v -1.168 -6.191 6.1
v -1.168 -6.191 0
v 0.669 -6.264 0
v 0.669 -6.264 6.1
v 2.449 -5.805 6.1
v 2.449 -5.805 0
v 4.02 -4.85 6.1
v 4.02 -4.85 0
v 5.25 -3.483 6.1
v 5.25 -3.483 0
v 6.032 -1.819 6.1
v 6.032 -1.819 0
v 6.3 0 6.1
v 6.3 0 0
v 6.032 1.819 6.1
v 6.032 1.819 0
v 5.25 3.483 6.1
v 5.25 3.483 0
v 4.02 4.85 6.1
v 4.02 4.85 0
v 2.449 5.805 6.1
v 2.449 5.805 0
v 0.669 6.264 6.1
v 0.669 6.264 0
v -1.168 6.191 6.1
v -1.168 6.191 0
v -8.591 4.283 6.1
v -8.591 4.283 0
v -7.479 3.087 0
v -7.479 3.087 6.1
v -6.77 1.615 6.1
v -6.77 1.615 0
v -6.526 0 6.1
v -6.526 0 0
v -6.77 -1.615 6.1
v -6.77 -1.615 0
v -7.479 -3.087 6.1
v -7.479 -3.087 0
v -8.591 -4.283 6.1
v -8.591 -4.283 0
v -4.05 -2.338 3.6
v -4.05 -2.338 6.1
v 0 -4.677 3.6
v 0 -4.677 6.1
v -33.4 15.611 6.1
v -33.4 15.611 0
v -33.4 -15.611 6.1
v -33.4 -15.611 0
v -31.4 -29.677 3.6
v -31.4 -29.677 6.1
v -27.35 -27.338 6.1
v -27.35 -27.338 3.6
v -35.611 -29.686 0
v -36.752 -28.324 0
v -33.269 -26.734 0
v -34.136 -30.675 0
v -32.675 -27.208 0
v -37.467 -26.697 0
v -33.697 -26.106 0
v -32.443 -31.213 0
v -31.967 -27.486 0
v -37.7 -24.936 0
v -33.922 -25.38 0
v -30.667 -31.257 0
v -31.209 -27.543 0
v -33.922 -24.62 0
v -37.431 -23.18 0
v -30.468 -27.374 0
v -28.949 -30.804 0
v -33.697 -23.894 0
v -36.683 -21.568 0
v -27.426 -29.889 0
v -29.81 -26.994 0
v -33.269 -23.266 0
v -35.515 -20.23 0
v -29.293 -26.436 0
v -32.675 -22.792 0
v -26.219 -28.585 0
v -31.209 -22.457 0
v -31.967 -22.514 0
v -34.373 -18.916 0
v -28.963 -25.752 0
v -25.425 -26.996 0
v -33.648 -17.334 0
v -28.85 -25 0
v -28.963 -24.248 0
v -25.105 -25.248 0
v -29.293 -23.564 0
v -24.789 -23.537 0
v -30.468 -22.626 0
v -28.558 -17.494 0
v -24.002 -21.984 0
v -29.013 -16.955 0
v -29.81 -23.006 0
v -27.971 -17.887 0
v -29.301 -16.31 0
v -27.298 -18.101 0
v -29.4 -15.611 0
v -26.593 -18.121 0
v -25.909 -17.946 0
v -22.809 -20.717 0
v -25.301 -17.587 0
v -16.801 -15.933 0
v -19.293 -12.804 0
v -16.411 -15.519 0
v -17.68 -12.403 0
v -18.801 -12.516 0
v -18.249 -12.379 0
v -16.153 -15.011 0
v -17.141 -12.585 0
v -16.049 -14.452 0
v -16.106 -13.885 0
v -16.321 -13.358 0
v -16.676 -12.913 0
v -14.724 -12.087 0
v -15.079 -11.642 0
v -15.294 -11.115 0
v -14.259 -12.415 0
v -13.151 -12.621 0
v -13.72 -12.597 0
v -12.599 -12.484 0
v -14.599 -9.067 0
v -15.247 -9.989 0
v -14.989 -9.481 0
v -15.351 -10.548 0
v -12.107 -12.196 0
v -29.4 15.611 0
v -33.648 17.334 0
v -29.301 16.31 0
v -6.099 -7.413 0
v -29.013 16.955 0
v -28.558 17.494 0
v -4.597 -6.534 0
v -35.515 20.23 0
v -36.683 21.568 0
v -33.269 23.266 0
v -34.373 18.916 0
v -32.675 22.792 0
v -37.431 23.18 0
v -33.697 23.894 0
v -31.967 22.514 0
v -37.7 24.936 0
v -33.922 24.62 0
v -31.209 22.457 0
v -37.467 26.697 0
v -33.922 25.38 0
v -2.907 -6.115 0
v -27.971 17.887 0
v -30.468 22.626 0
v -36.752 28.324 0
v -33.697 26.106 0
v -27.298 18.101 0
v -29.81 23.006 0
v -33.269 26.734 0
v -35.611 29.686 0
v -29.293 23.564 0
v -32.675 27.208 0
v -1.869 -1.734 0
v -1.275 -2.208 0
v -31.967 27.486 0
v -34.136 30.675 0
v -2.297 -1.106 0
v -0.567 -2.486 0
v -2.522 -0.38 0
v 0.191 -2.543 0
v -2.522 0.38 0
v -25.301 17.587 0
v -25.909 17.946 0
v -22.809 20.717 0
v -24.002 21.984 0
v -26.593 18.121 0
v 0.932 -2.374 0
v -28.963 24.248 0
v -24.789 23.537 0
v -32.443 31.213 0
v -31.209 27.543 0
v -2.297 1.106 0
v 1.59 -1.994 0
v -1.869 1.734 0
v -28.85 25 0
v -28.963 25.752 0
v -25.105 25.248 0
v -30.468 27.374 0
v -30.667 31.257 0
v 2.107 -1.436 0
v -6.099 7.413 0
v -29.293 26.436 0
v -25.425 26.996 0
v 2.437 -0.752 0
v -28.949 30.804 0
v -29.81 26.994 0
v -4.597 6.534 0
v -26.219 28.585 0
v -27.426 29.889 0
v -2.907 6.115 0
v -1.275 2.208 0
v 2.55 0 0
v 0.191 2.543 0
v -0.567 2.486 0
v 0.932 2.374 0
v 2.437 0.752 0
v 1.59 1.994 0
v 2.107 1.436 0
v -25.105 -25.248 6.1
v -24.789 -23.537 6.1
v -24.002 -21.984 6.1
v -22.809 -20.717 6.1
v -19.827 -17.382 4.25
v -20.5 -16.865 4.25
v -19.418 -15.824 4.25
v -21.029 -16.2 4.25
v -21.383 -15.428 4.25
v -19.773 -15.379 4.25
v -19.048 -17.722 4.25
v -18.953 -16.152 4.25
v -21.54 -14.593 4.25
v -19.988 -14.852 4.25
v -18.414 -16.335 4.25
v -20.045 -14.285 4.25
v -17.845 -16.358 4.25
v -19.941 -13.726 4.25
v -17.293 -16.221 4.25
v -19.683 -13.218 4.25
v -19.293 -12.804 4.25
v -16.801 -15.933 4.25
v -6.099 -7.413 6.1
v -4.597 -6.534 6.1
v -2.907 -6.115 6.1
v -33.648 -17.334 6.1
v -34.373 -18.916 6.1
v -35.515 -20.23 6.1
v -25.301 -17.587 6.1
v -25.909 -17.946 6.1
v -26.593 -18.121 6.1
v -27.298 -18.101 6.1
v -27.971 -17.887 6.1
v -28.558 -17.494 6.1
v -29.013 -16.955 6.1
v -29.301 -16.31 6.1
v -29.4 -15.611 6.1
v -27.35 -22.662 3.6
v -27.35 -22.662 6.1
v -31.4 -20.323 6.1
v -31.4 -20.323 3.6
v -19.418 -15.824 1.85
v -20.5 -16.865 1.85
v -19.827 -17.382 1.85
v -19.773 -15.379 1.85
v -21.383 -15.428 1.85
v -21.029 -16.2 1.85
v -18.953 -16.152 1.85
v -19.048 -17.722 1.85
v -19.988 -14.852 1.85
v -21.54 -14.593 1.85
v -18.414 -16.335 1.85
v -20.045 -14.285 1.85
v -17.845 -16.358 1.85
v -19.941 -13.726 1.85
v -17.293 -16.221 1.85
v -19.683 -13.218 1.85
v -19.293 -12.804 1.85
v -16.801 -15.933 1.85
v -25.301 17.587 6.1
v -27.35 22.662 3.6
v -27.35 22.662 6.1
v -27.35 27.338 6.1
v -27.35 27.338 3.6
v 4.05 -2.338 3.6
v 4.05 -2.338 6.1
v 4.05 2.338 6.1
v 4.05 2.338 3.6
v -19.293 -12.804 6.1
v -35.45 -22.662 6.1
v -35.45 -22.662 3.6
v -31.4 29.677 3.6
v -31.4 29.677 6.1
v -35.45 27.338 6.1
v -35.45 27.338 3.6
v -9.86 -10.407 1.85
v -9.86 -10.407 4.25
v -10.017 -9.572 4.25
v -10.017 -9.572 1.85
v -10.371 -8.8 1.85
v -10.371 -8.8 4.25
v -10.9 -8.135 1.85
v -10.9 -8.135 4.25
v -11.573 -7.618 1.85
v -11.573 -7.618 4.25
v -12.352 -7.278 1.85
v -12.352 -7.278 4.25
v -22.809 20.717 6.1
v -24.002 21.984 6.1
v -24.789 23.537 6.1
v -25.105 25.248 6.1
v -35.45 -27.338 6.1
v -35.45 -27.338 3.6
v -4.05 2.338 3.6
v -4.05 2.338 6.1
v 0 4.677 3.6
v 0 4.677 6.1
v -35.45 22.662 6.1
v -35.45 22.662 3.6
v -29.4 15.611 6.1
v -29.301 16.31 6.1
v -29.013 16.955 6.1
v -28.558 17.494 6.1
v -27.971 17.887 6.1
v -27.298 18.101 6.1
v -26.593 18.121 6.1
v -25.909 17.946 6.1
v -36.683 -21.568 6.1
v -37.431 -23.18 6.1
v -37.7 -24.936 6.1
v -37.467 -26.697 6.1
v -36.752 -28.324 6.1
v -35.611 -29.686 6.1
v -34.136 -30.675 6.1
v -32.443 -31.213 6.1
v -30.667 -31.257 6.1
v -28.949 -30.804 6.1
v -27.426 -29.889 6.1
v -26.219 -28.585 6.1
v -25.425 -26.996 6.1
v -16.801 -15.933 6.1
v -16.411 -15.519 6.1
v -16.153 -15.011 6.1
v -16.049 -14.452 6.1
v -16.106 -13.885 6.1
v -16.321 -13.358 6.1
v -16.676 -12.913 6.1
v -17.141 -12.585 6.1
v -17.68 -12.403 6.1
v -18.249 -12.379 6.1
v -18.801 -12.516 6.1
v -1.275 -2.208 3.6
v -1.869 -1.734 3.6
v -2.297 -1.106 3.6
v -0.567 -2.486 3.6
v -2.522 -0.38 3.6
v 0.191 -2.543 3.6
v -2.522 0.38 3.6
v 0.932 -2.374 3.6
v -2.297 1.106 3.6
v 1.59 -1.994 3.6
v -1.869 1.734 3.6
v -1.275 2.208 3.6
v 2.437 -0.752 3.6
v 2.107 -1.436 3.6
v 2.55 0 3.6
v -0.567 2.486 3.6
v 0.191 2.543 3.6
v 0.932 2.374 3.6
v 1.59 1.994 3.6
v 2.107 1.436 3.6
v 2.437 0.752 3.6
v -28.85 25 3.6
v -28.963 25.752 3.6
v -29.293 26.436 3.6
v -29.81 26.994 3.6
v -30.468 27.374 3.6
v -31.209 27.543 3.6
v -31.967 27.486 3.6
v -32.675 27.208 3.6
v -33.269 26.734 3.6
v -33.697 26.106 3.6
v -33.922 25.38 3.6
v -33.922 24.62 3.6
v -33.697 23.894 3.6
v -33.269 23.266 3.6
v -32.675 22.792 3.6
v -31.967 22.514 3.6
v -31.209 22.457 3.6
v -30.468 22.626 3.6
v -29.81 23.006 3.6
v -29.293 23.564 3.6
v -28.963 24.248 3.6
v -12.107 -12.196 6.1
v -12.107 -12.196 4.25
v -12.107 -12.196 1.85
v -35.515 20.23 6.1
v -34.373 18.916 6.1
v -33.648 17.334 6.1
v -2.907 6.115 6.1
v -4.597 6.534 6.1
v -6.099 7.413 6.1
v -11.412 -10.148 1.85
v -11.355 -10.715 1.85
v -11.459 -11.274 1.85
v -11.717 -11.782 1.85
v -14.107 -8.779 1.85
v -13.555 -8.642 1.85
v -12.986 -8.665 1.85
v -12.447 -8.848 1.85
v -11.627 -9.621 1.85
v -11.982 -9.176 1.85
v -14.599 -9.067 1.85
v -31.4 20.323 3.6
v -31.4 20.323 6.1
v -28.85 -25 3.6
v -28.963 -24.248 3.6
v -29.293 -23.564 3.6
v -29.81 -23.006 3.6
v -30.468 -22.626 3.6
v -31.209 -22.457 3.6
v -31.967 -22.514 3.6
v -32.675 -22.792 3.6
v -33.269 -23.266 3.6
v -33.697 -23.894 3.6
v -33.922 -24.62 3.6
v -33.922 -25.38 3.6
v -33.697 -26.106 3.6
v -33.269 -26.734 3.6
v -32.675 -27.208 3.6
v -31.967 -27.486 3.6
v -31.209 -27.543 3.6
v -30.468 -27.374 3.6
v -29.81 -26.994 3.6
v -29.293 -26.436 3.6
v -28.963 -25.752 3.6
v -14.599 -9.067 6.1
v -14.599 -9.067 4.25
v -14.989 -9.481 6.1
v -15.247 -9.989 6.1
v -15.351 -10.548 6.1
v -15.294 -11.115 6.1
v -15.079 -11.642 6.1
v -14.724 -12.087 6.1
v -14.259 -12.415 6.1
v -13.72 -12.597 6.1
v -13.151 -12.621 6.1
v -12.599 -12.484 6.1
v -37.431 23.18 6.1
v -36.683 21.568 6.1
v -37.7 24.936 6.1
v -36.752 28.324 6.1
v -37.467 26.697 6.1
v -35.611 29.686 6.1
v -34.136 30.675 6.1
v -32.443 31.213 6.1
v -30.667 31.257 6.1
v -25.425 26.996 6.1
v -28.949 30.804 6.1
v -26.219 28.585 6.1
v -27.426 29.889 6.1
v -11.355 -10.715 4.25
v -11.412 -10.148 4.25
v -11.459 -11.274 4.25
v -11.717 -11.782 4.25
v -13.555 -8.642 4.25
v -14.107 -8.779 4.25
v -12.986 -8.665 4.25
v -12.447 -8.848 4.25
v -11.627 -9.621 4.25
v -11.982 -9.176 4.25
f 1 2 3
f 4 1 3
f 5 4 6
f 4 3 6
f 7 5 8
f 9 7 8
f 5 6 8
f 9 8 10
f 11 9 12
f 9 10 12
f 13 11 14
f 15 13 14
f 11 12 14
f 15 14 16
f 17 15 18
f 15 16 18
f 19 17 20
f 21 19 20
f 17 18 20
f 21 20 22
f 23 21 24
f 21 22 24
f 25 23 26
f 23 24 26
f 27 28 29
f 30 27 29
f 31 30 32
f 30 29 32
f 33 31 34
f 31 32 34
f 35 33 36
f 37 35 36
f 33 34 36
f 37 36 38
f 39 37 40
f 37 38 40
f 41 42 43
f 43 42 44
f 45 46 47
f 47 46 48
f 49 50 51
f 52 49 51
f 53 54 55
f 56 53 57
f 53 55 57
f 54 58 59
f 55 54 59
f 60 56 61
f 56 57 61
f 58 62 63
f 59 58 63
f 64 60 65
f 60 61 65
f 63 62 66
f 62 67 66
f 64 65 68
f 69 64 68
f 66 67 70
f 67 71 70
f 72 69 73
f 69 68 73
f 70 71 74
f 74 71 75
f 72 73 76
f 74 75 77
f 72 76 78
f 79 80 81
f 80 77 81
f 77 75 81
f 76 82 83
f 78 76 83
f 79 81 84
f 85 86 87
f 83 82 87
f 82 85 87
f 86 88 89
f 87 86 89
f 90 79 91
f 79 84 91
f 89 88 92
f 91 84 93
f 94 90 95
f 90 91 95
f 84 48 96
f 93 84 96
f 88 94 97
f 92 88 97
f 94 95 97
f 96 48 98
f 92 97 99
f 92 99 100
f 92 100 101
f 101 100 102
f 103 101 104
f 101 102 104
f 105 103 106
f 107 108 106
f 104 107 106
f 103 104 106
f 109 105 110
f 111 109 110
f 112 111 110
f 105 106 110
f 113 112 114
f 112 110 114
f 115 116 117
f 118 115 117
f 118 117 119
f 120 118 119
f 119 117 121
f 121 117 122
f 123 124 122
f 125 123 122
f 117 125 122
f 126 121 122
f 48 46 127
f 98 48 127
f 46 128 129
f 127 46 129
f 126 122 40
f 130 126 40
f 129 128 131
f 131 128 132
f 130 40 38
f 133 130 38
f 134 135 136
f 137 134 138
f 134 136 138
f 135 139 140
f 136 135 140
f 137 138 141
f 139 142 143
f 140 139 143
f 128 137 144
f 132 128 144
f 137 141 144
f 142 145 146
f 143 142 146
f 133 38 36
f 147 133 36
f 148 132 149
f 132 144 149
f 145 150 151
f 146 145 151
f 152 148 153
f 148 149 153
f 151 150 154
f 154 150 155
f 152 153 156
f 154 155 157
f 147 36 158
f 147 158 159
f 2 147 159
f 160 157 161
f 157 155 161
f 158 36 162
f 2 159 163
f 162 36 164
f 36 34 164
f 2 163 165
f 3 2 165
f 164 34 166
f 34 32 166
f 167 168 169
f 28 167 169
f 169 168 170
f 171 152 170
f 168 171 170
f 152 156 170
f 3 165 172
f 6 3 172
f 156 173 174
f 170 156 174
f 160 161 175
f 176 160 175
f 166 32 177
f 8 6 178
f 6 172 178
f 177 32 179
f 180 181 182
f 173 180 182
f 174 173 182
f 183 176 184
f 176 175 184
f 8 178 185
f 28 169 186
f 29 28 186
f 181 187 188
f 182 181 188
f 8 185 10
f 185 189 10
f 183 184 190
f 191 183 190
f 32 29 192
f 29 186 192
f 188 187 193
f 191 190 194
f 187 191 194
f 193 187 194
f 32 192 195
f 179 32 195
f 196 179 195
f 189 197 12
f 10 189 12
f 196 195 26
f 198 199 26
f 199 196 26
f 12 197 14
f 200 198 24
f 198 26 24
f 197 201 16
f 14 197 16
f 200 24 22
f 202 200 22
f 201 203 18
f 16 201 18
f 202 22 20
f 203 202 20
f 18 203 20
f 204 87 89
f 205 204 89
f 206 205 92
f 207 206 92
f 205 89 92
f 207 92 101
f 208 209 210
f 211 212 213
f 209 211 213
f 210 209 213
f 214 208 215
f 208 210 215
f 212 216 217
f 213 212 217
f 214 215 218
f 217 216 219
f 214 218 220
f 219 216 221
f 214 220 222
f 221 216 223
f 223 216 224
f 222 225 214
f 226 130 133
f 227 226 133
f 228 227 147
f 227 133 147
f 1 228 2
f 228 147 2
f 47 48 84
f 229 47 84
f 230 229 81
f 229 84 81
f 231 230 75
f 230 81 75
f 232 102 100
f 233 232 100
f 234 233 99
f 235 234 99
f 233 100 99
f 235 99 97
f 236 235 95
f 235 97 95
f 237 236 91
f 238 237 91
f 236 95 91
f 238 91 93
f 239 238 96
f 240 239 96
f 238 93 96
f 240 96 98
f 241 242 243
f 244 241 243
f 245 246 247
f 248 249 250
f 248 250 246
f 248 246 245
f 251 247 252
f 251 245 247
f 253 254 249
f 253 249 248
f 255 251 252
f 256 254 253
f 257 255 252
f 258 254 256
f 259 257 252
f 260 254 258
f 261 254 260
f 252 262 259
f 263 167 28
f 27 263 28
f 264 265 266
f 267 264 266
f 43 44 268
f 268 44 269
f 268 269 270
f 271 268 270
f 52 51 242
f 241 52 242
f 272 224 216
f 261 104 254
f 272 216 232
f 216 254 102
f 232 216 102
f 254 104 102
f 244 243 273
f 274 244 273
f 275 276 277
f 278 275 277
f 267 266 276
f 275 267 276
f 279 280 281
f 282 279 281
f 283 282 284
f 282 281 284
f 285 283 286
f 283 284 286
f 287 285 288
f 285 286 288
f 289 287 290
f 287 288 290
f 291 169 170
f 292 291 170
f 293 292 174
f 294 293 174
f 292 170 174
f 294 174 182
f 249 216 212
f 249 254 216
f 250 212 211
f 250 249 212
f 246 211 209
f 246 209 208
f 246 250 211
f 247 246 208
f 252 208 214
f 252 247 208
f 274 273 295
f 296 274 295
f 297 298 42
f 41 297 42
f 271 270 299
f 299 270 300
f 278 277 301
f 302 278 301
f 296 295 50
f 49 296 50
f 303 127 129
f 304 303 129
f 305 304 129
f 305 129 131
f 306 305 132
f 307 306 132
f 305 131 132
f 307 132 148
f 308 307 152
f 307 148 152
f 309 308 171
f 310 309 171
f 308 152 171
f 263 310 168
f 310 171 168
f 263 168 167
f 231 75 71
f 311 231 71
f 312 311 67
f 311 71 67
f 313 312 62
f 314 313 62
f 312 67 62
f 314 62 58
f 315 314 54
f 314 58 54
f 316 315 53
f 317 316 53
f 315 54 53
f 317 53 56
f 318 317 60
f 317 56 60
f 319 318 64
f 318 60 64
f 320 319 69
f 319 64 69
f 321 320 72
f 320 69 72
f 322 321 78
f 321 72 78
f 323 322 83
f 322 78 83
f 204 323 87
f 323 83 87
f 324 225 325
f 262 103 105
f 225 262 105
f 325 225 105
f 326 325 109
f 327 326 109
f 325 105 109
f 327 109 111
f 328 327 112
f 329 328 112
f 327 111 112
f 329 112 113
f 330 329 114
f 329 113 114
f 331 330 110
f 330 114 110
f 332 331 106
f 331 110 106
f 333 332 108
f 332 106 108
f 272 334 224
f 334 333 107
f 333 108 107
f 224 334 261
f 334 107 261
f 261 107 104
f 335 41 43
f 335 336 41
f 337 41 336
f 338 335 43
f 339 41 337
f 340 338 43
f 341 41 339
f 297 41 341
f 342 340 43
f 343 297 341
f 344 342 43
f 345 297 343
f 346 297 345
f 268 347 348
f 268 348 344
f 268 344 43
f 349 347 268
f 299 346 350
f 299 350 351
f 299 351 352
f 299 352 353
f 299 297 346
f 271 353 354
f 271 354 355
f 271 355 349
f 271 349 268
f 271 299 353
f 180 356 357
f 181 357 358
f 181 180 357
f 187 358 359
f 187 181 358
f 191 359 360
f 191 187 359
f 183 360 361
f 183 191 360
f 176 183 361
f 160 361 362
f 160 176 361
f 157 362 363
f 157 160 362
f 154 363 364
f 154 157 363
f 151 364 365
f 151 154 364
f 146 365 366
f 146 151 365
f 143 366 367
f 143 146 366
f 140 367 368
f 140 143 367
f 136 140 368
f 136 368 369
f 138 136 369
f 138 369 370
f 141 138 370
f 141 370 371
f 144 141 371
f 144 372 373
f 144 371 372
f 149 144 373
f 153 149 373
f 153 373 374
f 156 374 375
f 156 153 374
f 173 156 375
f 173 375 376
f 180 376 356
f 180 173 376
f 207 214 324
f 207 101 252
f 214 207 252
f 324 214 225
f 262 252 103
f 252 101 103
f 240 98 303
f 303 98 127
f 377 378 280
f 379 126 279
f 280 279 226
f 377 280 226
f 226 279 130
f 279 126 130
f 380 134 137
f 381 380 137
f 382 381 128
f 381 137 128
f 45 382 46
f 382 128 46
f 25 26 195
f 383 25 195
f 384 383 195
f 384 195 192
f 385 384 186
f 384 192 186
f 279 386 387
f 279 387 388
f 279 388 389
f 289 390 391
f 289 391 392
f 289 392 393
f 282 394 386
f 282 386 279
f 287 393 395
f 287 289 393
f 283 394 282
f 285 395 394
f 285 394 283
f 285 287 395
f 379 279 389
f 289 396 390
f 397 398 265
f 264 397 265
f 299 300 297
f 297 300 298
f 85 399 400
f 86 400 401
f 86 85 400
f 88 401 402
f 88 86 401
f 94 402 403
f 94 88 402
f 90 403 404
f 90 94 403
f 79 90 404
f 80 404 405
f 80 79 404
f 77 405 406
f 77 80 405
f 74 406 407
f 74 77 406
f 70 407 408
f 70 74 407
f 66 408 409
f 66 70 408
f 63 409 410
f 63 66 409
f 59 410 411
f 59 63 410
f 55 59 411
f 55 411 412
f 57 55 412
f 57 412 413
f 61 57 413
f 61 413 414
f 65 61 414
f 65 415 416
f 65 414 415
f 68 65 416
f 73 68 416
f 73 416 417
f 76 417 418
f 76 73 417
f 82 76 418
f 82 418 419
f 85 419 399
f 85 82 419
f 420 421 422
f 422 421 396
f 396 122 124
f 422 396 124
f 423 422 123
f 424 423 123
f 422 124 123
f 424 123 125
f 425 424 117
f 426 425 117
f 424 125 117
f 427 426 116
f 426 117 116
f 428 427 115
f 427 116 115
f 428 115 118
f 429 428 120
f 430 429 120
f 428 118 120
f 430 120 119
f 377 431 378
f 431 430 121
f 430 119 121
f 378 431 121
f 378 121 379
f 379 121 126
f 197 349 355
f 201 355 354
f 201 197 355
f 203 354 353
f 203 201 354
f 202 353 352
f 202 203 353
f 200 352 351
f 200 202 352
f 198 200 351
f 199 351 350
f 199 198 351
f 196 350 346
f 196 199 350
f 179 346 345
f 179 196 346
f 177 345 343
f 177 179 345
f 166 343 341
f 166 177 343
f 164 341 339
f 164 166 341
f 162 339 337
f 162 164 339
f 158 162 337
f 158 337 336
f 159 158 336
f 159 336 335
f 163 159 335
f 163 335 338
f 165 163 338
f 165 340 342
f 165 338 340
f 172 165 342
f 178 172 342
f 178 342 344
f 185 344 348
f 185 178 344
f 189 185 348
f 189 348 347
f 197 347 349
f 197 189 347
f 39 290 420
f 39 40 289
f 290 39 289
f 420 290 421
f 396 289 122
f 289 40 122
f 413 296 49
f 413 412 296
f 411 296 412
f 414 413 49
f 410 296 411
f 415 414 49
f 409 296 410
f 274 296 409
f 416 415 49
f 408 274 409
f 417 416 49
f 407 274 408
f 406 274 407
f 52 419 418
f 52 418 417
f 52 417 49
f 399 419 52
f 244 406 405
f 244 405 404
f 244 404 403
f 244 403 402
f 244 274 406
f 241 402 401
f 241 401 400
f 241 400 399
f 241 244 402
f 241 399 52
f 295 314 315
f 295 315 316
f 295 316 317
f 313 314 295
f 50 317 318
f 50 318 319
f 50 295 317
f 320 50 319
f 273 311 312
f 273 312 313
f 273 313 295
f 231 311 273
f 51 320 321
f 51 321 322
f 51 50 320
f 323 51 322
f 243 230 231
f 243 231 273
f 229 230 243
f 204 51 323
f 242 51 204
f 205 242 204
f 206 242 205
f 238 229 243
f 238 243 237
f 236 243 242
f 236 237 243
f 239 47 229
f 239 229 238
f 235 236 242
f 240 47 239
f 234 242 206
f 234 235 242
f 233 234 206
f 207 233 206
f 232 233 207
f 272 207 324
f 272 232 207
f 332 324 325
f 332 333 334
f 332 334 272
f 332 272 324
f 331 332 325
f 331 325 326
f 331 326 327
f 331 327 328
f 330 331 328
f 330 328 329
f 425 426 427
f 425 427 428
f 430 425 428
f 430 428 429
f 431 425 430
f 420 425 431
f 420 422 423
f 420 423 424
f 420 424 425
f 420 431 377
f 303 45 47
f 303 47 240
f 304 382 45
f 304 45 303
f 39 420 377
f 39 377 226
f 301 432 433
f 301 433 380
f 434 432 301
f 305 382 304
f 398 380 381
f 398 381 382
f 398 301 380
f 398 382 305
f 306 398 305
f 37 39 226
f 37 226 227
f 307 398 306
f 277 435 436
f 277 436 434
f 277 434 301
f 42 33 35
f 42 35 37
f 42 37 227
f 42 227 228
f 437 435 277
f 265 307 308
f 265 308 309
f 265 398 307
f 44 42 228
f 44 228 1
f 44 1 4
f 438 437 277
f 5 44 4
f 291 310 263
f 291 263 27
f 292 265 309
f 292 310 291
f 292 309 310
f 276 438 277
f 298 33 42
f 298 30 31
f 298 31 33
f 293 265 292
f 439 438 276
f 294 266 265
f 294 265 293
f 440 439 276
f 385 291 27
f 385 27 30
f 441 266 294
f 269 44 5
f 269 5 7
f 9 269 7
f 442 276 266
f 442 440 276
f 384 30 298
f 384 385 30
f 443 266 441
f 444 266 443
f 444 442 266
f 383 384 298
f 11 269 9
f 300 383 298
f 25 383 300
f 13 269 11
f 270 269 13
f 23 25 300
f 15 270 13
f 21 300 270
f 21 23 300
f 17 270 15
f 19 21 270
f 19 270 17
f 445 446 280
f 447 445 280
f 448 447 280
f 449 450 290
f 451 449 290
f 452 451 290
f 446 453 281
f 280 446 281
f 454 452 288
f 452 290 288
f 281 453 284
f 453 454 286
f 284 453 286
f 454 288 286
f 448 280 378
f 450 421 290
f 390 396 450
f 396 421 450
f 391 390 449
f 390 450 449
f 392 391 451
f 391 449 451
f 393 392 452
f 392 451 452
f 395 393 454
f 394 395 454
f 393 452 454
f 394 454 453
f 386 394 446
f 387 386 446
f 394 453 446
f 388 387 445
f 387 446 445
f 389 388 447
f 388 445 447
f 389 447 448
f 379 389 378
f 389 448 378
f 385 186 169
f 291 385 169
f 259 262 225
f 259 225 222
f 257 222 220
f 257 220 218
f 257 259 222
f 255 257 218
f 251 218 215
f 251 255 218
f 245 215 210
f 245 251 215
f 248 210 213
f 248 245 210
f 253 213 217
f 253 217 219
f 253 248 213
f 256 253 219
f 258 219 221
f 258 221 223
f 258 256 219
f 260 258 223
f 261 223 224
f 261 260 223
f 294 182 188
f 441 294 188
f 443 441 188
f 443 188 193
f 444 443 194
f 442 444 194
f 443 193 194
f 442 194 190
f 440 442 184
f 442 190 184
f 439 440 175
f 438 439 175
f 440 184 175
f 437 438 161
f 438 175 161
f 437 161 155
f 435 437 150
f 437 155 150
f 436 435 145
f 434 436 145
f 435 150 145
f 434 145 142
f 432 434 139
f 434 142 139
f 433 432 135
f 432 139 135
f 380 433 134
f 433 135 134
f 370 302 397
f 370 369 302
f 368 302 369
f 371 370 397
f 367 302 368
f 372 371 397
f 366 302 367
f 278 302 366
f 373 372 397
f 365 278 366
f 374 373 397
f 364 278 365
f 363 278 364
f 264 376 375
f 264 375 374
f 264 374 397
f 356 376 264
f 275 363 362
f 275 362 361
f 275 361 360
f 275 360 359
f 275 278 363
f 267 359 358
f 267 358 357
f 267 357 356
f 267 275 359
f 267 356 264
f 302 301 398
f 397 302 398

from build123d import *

# Parameters (mm, degrees)
F0_R     = 2.55
F1_DEPTH = 6.1
F3_DEPTH = 2.5
F6_DEPTH = 1.2


with BuildPart() as f1:
    # F0 (on Top) → F1 (new body)
    with BuildSketch(Plane.XY):
        with BuildLine():
            ThreePointArc((-22.8091472875, 20.7166310371), (-24.4512119604, 22.7321355607), (-25.1048969271, 25.2483491523))
            ThreePointArc((-25.1048969271, 25.2483491523), (-34.1357153903, 30.6750208196), (-35.5153225806, 20.2298721131))
            ThreePointArc((-35.5153225806, 20.2298721131), (-33.9539864651, 18.15120321), (-33.4, 15.6111768576))
            Line((-33.4, 15.6111768576), (-33.4, -15.6111768576))
            ThreePointArc((-33.4, -15.6111768576), (-33.9539864651, -18.15120321), (-35.5153225806, -20.2298721131))
            ThreePointArc((-35.5153225806, -20.2298721131), (-34.1357149704, -30.6750210221), (-25.1048968903, -25.2483482207))
            ThreePointArc((-25.1048968903, -25.2483482207), (-24.4512125214, -22.7321357825), (-22.8091487233, -20.7166321802))
            Line((-22.8091487233, -20.7166321802), (-16.801235426, -15.9332617206))
            ThreePointArc((-16.801235426, -15.9332617206), (-16.4823258273, -13.1228708816), (-19.2927166663, -12.8039612829))
            Line((-19.2927166663, -12.8039612829), (-25.3006299635, -17.5873317424))
            ThreePointArc((-25.3006299635, -17.5873317424), (-27.9708920533, -17.8865901621), (-29.4, -15.6111768576))
            Line((-29.4, -15.6111768576), (-29.4, 15.6111768576))
            ThreePointArc((-29.4, 15.6111768576), (-27.9708912267, 17.8865905605), (-25.3006285278, 17.5873305993))
            Line((-25.3006285278, 17.5873305993), (-8.5908527125, 4.2833689629))
            ThreePointArc((-8.5908527125, 4.2833689629), (-6.5260006587, 0), (-8.5908527125, -4.2833689629))
            Line((-8.5908527125, -4.2833689629), (-14.5987660097, -9.0667394225))
            ThreePointArc((-14.5987660097, -9.0667394225), (-14.9176756084, -11.8771302615), (-12.1072847694, -12.1960398602))
            Line((-12.1072847694, -12.1960398602), (-6.0993714722, -7.4126694007))
            ThreePointArc((-6.0993714722, -7.4126694007), (-3.7671833568, -6.2639599209), (-1.1684785693, -6.1906912242))
            ThreePointArc((-1.1684785693, -6.1906912242), (6.3, 0), (-1.1684785693, 6.1906912242))
            ThreePointArc((-1.1684785693, 6.1906912242), (-3.7671833568, 6.2639599209), (-6.0993714722, 7.4126694007))
            Line((-6.0993714722, 7.4126694007), (-22.8091472875, 20.7166310371))
        make_face()
        with Locations((-31.4, -25)):
            Circle(F0_R, mode=Mode.SUBTRACT)
        with Locations((-31.4, 25)):
            Circle(F0_R, mode=Mode.SUBTRACT)
        Circle(F0_R, mode=Mode.SUBTRACT)
    extrude(amount=F1_DEPTH)

    # F2 (on face) → F3 (cut)
    with BuildSketch(Plane.XY.offset(6.1)):
        Polygon((-27.35, 22.6617314098), (-27.35, 27.3382685902), (-31.4, 29.6765371804), (-35.45, 27.3382685902), (-35.45, 22.6617314098), (-31.4, 20.3234628196), align=None)
        Polygon((-27.35, -27.3382685902), (-27.35, -22.6617314098), (-31.4, -20.3234628196), (-35.45, -22.6617314098), (-35.45, -27.3382685902), (-31.4, -29.6765371804), align=None)
        Polygon((-4.05, 2.3382685902), (-4.05, -2.3382685902), (0, -4.6765371804), (4.05, -2.3382685902), (4.05, 2.3382685902), (0, 4.6765371804), align=None)
    extrude(amount=-F3_DEPTH, mode=Mode.SUBTRACT)

    # F5 (on mid) → F6 (cut, symmetric)
    with BuildSketch(Plane.XY.offset(3.05)):
        with BuildLine():
            Line((-19.2927166663, -12.8039612829), (-21.5397744668, -14.5930200413))
            ThreePointArc((-21.5397744668, -14.5930200413), (-20.7851139292, -16.5486575869), (-19.0482932266, -17.722320479))
            Line((-19.0482932266, -17.722320479), (-16.801235426, -15.9332617206))
            ThreePointArc((-16.801235426, -15.9332617206), (-19.611626265, -15.6143521218), (-19.2927166663, -12.8039612829))
        make_face()
        with BuildLine():
            ThreePointArc((-14.5987660097, -9.0667394225), (-11.7883751707, -9.3856490213), (-12.1072847694, -12.1960398602))
            Line((-12.1072847694, -12.1960398602), (-9.8602269689, -10.4069811018))
            ThreePointArc((-9.8602269689, -10.4069811018), (-10.6148875066, -8.4513435562), (-12.3517082091, -7.2776806641))
            Line((-12.3517082091, -7.2776806641), (-14.5987660097, -9.0667394225))
        make_face()
    extrude(amount=F6_DEPTH, both=True, mode=Mode.SUBTRACT)


solid = f1.part
